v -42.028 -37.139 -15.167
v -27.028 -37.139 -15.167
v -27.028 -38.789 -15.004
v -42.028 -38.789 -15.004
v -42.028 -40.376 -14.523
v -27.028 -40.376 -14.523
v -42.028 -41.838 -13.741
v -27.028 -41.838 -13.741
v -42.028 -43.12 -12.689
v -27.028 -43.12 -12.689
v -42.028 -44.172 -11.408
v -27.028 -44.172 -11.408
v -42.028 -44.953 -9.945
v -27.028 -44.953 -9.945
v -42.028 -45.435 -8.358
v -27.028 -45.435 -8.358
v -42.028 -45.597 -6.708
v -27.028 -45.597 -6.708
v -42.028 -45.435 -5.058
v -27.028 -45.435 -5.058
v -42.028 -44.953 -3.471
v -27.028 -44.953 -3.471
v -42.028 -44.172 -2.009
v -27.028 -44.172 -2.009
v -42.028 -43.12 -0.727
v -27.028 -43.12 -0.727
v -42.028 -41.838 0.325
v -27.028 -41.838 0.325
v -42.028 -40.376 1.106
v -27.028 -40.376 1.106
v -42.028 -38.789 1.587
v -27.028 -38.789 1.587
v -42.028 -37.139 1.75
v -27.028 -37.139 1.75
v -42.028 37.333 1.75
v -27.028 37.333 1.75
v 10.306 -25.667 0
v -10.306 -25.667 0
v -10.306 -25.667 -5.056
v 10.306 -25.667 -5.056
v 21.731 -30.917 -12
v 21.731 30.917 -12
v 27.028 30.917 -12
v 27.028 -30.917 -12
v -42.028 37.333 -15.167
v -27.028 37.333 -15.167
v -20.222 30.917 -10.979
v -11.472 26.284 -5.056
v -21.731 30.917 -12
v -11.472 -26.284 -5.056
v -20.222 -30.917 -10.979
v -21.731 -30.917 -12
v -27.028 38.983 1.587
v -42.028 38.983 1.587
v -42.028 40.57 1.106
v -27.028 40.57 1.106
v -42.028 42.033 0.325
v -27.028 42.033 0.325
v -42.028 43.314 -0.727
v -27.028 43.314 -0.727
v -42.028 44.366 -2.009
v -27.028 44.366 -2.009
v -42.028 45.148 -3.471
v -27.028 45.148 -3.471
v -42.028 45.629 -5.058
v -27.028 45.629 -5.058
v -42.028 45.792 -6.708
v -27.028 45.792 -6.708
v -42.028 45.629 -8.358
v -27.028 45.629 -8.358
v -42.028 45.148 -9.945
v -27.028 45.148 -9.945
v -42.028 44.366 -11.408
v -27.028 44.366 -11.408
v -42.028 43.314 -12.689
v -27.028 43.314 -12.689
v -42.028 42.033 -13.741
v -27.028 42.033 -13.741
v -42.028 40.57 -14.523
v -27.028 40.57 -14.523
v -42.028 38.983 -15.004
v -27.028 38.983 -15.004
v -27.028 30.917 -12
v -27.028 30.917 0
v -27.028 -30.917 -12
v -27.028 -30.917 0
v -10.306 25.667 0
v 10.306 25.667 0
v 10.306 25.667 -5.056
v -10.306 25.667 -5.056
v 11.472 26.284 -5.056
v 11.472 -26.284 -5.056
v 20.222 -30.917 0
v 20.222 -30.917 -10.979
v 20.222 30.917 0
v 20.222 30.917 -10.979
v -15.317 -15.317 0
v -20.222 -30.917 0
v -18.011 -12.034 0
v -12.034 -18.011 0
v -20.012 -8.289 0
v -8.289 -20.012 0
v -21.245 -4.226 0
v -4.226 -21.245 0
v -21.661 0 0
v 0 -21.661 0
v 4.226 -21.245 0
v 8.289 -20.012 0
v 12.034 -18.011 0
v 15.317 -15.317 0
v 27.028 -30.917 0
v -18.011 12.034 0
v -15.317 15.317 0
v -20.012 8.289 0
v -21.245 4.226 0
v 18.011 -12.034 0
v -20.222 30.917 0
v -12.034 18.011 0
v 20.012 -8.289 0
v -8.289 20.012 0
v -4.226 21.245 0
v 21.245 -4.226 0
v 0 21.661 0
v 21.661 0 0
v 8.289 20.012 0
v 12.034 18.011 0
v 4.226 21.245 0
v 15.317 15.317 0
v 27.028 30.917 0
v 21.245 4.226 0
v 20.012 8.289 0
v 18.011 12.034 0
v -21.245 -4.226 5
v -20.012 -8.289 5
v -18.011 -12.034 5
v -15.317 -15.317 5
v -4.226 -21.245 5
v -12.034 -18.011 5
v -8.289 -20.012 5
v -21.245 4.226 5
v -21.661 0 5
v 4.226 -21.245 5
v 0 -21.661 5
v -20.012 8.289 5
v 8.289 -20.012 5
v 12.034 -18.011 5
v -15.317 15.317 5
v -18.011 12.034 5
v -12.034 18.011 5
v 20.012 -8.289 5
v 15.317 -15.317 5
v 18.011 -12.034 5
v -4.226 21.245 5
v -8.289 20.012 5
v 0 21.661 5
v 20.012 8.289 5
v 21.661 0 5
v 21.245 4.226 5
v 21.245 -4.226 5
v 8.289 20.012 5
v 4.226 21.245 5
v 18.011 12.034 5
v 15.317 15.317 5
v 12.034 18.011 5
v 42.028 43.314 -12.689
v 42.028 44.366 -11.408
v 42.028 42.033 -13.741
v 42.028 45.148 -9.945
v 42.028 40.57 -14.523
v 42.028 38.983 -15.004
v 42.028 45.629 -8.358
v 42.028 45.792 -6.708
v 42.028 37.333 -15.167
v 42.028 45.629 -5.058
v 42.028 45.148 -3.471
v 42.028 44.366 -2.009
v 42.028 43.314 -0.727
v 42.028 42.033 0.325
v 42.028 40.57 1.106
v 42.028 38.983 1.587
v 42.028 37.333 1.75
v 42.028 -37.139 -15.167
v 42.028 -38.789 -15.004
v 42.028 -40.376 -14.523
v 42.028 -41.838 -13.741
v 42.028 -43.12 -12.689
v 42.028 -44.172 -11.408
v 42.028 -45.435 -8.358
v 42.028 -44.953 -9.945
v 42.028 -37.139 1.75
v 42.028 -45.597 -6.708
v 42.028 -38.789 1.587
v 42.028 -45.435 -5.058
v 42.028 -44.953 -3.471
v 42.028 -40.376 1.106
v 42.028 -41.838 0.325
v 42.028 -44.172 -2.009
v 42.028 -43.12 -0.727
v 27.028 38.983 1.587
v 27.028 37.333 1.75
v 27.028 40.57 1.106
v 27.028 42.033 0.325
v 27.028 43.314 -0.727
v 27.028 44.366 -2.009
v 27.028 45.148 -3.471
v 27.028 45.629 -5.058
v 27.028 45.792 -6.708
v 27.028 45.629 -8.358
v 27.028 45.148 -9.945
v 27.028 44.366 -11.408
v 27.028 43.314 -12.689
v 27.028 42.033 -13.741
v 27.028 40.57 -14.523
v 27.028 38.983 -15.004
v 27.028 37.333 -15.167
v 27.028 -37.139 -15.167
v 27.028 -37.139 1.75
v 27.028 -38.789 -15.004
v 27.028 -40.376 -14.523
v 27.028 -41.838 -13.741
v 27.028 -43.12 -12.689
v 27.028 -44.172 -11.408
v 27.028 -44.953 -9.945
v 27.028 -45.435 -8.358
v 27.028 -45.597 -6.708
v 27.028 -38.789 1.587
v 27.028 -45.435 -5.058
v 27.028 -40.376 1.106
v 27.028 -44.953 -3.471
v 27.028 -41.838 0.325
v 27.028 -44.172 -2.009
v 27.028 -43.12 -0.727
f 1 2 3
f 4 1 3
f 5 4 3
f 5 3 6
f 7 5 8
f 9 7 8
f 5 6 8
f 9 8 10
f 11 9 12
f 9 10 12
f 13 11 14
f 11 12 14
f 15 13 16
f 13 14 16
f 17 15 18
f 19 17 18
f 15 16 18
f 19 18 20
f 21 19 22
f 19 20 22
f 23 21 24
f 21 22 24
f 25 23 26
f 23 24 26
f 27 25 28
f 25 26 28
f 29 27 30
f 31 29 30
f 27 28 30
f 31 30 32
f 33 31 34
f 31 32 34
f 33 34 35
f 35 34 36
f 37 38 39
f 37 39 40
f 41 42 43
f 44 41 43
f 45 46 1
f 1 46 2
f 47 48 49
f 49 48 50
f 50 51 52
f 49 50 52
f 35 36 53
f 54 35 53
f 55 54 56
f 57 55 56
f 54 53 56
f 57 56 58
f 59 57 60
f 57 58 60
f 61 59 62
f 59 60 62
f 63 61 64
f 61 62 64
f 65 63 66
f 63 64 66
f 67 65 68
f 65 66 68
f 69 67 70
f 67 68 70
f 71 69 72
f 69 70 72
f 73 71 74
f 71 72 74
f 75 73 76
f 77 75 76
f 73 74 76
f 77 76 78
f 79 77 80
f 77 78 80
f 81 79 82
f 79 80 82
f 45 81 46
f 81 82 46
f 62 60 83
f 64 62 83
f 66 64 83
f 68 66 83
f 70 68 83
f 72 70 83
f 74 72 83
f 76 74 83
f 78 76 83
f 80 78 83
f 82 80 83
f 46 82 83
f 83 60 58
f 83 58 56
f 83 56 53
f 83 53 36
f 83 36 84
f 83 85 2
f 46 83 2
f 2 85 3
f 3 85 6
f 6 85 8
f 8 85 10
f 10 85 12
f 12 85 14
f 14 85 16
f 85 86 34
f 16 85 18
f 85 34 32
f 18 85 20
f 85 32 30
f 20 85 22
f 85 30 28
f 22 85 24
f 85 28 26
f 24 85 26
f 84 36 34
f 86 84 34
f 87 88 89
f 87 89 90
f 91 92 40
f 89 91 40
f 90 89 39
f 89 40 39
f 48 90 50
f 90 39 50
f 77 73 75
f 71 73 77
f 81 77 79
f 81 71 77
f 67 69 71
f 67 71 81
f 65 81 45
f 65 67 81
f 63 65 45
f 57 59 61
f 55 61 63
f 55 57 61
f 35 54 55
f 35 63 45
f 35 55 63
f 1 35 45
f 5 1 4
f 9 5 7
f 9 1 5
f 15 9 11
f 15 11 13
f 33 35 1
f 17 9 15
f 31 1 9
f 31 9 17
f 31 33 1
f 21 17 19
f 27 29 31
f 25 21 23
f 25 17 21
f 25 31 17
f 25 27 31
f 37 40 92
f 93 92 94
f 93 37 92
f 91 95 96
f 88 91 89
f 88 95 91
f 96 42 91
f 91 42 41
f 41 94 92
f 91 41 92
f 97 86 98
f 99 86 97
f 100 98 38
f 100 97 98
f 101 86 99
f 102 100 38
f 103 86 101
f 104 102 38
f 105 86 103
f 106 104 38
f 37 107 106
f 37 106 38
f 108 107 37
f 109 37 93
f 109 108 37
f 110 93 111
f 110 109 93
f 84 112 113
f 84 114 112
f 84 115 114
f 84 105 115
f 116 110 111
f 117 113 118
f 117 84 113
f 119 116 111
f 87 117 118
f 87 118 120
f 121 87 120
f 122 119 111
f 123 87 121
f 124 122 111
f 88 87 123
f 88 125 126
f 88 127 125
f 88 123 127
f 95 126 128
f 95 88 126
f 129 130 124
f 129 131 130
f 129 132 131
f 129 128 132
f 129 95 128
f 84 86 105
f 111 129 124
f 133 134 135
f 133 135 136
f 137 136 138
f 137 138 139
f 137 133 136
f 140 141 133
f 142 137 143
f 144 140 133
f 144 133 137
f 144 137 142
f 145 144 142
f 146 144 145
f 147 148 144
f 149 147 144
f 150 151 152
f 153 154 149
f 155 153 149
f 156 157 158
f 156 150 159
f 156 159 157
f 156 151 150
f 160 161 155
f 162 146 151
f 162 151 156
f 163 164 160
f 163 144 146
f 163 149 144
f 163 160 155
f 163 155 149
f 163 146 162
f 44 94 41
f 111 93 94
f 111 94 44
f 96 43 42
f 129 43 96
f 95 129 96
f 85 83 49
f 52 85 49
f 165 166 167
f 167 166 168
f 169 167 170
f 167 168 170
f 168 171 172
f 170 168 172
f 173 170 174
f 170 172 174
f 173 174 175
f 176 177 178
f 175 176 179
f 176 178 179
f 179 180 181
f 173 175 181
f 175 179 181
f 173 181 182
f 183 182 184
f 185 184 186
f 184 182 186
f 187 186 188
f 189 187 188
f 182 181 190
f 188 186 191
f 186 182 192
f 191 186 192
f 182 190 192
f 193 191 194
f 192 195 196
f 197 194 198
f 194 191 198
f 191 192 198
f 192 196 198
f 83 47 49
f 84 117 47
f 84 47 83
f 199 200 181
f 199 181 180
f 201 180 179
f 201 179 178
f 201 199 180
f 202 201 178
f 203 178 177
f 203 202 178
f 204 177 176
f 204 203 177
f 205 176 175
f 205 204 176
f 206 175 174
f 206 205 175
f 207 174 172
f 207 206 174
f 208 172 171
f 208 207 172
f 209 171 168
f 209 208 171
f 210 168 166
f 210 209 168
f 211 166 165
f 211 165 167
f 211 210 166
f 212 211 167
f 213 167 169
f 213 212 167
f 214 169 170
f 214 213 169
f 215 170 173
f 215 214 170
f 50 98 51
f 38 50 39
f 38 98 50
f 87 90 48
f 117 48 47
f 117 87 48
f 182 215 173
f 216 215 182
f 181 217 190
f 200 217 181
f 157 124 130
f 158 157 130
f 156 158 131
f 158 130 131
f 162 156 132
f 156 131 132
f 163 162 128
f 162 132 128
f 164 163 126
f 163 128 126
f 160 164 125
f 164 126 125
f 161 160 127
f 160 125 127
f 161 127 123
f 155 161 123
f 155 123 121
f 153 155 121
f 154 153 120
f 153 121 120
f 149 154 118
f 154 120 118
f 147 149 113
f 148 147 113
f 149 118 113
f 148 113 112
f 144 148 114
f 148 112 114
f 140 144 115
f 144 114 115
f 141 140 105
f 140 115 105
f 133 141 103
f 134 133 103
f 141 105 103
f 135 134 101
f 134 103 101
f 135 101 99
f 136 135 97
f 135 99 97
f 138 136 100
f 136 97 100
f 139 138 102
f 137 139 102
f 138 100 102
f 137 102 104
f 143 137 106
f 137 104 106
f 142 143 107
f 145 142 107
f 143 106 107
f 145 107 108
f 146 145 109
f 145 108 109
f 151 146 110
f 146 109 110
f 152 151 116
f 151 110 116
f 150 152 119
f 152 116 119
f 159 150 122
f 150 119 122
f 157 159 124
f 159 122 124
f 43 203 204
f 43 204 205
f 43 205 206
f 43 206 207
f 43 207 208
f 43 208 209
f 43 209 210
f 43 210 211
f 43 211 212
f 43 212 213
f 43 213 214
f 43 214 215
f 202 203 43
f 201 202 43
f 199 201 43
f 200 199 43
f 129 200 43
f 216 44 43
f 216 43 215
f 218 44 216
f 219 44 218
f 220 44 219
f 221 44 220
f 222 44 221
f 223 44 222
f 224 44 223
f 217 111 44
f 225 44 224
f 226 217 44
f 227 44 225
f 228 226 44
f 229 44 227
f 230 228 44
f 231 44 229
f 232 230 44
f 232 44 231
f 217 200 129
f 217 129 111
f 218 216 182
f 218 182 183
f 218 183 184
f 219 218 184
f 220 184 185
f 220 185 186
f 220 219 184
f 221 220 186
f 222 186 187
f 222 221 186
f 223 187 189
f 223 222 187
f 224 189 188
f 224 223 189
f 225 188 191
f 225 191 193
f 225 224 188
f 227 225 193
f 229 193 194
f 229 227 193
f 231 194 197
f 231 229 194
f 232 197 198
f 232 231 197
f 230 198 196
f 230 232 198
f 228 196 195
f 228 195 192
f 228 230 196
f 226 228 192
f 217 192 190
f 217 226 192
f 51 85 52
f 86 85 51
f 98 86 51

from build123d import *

# Parameters (mm, degrees)
F0_R     = 21.6611468636
F1_DEPTH = 12
F5_DEPTH = 15
F8_DEPTH = 32.9
F9_DEPTH = 5


with BuildPart() as f1:
    # F0 (on Top) → F1 (new body)
    with BuildSketch(Plane.XY):
        Polygon((-20.2222224325, 30.916666612), (-27.0277783275, 30.916666612), (-27.0277783275, 0), (-27.0277783275, -30.916666612), (-20.2222224325, -30.916666612), (-10.3055555373, -25.6666671485), (0, -25.6666671485), (10.3055555373, -25.6666671485), (20.2222224325, -30.916666612), (27.0277783275, -30.916666612), (27.0277783275, 0), (27.0277783275, 30.916666612), (20.2222224325, 30.916666612), (10.3055555373, 25.6666671485), (0, 25.6666671485), (-10.3055555373, 25.6666671485), align=None)
        Circle(F0_R, mode=Mode.SUBTRACT)
        Circle(F0_R)
    extrude(amount=-F1_DEPTH)

    # F4 (on plane+point) → F5 (join)
    with BuildSketch(Plane(origin=(-27.0277783275, 0, 0), x_dir=(0, -1, 0), z_dir=(-1, 0, 0))):
        with BuildLine():
            ThreePointArc((-37.3333357275, 1.750000054), (-45.7916693995, -6.708333618), (-37.3333357275, -15.16666729))
            Line((-37.3333357275, -15.16666729), (37.138890475, -15.16666729))
            ThreePointArc((37.138890475, -15.16666729), (45.5972241471, -6.708333618), (37.138890475, 1.750000054))
            Line((37.138890475, 1.750000054), (-37.3333357275, 1.750000054))
        make_face()
    extrude(amount=F5_DEPTH)

    # F6: F1 across plane


with BuildPart() as f1_1:
    add(f1.part)
    add(f1.part.mirror(Plane.YZ))

    # F7 (on Front) → F8 (cut, symmetric)
    with BuildSketch(Plane.XZ):
        Polygon((11.4722223952, -5.0555560738), (0, -5.0555560738), (-11.4722223952, -5.0555560738), (-24.1111125797, -13.6111117899), (0, -13.6111117899), (24.1111125797, -13.6111117899), align=None)
    extrude(amount=F8_DEPTH, both=True, mode=Mode.SUBTRACT)

    # F0 (on Top) → F9 (join)
    with BuildSketch(Plane.XY):
        Circle(F0_R)
    extrude(amount=F9_DEPTH)


solid = f1_1.part
